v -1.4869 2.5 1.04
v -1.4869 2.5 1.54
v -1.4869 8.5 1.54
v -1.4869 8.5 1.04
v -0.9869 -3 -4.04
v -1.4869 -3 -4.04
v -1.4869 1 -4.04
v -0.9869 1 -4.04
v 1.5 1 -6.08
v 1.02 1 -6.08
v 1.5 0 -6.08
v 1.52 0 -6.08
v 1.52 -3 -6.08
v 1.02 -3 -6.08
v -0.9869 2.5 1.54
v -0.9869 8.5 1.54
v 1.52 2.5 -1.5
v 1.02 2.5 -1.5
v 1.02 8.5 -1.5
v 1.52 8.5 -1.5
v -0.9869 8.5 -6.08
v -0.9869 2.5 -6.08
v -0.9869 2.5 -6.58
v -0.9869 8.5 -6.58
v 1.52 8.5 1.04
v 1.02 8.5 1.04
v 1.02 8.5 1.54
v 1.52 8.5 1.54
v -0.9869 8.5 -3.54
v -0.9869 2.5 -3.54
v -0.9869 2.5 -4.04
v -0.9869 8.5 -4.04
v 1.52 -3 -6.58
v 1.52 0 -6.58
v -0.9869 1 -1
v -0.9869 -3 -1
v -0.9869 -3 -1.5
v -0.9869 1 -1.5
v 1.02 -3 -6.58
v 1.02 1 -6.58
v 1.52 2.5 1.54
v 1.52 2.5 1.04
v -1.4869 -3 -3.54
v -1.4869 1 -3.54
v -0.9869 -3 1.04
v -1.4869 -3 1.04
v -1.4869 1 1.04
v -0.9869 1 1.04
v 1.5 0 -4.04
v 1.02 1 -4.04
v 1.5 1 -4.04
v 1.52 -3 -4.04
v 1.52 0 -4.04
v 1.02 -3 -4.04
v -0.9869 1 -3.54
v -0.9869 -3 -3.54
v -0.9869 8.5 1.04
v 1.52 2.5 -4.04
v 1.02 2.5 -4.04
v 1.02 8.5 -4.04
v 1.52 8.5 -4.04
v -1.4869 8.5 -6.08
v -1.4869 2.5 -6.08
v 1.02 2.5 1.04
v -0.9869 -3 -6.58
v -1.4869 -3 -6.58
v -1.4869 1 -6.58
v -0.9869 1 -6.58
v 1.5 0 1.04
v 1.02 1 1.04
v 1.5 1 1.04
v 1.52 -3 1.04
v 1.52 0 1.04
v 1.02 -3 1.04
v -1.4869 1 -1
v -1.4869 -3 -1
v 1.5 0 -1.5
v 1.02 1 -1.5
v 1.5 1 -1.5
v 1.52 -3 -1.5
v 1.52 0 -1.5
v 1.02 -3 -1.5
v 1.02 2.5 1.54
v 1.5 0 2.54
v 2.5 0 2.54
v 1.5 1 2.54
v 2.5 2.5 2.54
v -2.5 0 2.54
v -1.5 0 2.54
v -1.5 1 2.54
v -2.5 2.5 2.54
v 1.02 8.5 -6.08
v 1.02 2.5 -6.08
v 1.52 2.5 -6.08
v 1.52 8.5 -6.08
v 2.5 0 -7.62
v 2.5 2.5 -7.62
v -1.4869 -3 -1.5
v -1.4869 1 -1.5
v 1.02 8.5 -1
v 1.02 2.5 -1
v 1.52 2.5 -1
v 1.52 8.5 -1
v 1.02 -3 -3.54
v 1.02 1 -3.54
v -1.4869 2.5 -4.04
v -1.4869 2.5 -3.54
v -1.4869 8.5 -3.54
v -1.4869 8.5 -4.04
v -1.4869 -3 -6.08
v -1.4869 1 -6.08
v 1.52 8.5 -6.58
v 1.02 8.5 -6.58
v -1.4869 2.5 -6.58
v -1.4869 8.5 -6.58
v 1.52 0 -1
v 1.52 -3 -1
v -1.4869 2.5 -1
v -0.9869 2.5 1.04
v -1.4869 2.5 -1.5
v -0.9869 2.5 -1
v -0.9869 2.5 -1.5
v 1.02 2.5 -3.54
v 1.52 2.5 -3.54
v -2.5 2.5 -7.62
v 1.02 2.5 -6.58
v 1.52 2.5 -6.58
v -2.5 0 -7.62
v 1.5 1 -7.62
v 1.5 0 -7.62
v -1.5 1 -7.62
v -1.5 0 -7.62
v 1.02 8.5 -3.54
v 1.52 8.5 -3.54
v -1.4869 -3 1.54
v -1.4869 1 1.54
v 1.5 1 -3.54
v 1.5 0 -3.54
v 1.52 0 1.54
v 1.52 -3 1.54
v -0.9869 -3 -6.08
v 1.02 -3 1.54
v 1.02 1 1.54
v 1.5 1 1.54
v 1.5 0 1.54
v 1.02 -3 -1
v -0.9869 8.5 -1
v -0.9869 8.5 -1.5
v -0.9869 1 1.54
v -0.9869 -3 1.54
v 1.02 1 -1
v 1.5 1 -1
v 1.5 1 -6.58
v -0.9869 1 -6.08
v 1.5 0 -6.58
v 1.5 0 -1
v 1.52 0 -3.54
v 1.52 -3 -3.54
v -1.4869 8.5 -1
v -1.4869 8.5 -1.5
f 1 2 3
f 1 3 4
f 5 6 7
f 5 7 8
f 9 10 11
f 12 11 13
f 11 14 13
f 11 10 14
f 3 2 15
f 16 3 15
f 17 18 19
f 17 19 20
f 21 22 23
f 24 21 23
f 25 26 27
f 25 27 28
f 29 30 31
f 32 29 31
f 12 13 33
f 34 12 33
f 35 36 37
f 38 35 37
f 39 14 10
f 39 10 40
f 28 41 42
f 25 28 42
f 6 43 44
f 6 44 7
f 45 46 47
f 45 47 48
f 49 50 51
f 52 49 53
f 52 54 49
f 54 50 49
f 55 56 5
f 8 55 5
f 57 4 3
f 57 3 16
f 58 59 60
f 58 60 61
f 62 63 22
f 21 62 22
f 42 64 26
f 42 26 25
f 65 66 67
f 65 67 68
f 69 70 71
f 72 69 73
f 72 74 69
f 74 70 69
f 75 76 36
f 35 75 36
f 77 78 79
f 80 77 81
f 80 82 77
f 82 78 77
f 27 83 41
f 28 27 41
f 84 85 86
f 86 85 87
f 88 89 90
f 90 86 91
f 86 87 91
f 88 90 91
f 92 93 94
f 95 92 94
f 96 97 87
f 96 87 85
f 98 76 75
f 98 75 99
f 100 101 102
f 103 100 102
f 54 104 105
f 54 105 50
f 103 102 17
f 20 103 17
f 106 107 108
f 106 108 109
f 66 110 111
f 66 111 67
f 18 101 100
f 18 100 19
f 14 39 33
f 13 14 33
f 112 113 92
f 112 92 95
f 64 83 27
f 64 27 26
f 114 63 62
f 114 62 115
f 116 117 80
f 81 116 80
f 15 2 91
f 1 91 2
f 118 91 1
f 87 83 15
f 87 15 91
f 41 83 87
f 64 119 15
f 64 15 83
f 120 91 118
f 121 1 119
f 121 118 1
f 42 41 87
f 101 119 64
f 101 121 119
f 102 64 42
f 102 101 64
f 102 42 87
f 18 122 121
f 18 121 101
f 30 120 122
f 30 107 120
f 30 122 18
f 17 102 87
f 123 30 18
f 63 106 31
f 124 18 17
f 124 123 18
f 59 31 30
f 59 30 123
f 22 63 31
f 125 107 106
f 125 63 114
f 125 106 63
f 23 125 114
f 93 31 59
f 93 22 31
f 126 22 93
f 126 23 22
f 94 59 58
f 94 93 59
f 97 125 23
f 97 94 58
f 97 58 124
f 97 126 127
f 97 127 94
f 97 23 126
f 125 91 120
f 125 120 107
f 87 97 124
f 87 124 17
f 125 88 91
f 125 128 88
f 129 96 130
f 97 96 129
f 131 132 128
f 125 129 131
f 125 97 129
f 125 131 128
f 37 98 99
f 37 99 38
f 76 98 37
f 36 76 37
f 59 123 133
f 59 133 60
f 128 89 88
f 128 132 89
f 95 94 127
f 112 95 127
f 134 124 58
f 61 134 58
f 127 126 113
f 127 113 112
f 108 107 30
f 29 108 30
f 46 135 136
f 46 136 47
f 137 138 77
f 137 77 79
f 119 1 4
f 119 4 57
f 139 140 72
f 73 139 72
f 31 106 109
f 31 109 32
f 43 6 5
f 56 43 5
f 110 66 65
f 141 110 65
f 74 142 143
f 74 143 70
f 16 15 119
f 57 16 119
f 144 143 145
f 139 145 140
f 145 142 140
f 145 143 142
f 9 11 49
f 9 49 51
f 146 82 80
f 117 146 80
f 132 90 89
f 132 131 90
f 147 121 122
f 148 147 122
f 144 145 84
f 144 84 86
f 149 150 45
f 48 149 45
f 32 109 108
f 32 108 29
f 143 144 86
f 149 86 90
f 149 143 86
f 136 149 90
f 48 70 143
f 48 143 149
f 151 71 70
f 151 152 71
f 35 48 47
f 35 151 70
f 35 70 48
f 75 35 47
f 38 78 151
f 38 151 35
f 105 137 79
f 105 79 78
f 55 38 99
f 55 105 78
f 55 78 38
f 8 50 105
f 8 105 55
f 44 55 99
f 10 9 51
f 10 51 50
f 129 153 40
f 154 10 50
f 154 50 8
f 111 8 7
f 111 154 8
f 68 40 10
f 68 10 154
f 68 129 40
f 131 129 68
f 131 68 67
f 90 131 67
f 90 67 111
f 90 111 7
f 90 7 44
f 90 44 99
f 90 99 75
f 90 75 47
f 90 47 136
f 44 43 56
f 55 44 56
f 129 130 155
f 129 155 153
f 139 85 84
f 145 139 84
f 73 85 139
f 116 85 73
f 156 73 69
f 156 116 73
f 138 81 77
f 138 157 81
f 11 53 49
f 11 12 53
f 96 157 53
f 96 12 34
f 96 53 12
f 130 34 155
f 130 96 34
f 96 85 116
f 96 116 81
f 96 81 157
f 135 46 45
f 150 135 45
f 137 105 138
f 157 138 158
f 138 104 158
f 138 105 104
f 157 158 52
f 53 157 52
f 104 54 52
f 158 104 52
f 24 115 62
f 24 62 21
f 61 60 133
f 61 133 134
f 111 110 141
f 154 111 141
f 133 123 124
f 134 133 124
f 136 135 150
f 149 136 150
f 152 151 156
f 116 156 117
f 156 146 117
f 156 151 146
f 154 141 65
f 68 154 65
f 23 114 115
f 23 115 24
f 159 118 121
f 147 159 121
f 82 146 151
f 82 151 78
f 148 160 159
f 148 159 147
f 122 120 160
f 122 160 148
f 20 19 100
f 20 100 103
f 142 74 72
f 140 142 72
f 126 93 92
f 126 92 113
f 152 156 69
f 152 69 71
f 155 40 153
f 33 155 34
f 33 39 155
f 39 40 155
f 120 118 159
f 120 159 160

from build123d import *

# Parameters (mm, degrees)
EXTRUDE_1_DEPTH        = 2.54
EXTRUDE_START          = -5.5
SKETCH_2_W             = 0.5
SKETCH_2_H             = 0.5
EXTRUDE_2_DEPTH        = 11.5
PATTERN_LINEAR_1_COUNT = 4
PATTERN_LINEAR_1_PITCH = 2.54


with BuildPart() as part:
    # Эскиз1 → Бобышка-Вытянуть1 (new body)
    with BuildSketch(Plane.XY):
        Polygon((-2.5, 0), (-2.5, 2.5), (2.5, 2.5), (2.5, 0), (1.5, 0), (1.5, 1), (-1.5, 1), (-1.5, 0), align=None)
    extrude_1 = extrude(amount=EXTRUDE_1_DEPTH)

    # Эскиз2 → Бобышка-Вытянуть2 (add)
    with BuildSketch(Plane(origin=(0, 2.5, 0), x_dir=(1, 0, 0), z_dir=(0, 1, 0)).offset(EXTRUDE_START)):
        with Locations((-1.236880281, -1.29)):
            Rectangle(SKETCH_2_W, SKETCH_2_H)
        with Locations((1.27, -1.29)):
            Rectangle(SKETCH_2_W, SKETCH_2_H)
    extrude_2 = extrude(amount=EXTRUDE_2_DEPTH)

    # Линейный массив1: Бобышка-Вытянуть1, Бобышка-Вытянуть2 ×4
    with Locations(*[(0, 0, -i * PATTERN_LINEAR_1_PITCH) for i in range(1, PATTERN_LINEAR_1_COUNT)]):
        add(extrude_1)
        add(extrude_2)


solid = part.part
